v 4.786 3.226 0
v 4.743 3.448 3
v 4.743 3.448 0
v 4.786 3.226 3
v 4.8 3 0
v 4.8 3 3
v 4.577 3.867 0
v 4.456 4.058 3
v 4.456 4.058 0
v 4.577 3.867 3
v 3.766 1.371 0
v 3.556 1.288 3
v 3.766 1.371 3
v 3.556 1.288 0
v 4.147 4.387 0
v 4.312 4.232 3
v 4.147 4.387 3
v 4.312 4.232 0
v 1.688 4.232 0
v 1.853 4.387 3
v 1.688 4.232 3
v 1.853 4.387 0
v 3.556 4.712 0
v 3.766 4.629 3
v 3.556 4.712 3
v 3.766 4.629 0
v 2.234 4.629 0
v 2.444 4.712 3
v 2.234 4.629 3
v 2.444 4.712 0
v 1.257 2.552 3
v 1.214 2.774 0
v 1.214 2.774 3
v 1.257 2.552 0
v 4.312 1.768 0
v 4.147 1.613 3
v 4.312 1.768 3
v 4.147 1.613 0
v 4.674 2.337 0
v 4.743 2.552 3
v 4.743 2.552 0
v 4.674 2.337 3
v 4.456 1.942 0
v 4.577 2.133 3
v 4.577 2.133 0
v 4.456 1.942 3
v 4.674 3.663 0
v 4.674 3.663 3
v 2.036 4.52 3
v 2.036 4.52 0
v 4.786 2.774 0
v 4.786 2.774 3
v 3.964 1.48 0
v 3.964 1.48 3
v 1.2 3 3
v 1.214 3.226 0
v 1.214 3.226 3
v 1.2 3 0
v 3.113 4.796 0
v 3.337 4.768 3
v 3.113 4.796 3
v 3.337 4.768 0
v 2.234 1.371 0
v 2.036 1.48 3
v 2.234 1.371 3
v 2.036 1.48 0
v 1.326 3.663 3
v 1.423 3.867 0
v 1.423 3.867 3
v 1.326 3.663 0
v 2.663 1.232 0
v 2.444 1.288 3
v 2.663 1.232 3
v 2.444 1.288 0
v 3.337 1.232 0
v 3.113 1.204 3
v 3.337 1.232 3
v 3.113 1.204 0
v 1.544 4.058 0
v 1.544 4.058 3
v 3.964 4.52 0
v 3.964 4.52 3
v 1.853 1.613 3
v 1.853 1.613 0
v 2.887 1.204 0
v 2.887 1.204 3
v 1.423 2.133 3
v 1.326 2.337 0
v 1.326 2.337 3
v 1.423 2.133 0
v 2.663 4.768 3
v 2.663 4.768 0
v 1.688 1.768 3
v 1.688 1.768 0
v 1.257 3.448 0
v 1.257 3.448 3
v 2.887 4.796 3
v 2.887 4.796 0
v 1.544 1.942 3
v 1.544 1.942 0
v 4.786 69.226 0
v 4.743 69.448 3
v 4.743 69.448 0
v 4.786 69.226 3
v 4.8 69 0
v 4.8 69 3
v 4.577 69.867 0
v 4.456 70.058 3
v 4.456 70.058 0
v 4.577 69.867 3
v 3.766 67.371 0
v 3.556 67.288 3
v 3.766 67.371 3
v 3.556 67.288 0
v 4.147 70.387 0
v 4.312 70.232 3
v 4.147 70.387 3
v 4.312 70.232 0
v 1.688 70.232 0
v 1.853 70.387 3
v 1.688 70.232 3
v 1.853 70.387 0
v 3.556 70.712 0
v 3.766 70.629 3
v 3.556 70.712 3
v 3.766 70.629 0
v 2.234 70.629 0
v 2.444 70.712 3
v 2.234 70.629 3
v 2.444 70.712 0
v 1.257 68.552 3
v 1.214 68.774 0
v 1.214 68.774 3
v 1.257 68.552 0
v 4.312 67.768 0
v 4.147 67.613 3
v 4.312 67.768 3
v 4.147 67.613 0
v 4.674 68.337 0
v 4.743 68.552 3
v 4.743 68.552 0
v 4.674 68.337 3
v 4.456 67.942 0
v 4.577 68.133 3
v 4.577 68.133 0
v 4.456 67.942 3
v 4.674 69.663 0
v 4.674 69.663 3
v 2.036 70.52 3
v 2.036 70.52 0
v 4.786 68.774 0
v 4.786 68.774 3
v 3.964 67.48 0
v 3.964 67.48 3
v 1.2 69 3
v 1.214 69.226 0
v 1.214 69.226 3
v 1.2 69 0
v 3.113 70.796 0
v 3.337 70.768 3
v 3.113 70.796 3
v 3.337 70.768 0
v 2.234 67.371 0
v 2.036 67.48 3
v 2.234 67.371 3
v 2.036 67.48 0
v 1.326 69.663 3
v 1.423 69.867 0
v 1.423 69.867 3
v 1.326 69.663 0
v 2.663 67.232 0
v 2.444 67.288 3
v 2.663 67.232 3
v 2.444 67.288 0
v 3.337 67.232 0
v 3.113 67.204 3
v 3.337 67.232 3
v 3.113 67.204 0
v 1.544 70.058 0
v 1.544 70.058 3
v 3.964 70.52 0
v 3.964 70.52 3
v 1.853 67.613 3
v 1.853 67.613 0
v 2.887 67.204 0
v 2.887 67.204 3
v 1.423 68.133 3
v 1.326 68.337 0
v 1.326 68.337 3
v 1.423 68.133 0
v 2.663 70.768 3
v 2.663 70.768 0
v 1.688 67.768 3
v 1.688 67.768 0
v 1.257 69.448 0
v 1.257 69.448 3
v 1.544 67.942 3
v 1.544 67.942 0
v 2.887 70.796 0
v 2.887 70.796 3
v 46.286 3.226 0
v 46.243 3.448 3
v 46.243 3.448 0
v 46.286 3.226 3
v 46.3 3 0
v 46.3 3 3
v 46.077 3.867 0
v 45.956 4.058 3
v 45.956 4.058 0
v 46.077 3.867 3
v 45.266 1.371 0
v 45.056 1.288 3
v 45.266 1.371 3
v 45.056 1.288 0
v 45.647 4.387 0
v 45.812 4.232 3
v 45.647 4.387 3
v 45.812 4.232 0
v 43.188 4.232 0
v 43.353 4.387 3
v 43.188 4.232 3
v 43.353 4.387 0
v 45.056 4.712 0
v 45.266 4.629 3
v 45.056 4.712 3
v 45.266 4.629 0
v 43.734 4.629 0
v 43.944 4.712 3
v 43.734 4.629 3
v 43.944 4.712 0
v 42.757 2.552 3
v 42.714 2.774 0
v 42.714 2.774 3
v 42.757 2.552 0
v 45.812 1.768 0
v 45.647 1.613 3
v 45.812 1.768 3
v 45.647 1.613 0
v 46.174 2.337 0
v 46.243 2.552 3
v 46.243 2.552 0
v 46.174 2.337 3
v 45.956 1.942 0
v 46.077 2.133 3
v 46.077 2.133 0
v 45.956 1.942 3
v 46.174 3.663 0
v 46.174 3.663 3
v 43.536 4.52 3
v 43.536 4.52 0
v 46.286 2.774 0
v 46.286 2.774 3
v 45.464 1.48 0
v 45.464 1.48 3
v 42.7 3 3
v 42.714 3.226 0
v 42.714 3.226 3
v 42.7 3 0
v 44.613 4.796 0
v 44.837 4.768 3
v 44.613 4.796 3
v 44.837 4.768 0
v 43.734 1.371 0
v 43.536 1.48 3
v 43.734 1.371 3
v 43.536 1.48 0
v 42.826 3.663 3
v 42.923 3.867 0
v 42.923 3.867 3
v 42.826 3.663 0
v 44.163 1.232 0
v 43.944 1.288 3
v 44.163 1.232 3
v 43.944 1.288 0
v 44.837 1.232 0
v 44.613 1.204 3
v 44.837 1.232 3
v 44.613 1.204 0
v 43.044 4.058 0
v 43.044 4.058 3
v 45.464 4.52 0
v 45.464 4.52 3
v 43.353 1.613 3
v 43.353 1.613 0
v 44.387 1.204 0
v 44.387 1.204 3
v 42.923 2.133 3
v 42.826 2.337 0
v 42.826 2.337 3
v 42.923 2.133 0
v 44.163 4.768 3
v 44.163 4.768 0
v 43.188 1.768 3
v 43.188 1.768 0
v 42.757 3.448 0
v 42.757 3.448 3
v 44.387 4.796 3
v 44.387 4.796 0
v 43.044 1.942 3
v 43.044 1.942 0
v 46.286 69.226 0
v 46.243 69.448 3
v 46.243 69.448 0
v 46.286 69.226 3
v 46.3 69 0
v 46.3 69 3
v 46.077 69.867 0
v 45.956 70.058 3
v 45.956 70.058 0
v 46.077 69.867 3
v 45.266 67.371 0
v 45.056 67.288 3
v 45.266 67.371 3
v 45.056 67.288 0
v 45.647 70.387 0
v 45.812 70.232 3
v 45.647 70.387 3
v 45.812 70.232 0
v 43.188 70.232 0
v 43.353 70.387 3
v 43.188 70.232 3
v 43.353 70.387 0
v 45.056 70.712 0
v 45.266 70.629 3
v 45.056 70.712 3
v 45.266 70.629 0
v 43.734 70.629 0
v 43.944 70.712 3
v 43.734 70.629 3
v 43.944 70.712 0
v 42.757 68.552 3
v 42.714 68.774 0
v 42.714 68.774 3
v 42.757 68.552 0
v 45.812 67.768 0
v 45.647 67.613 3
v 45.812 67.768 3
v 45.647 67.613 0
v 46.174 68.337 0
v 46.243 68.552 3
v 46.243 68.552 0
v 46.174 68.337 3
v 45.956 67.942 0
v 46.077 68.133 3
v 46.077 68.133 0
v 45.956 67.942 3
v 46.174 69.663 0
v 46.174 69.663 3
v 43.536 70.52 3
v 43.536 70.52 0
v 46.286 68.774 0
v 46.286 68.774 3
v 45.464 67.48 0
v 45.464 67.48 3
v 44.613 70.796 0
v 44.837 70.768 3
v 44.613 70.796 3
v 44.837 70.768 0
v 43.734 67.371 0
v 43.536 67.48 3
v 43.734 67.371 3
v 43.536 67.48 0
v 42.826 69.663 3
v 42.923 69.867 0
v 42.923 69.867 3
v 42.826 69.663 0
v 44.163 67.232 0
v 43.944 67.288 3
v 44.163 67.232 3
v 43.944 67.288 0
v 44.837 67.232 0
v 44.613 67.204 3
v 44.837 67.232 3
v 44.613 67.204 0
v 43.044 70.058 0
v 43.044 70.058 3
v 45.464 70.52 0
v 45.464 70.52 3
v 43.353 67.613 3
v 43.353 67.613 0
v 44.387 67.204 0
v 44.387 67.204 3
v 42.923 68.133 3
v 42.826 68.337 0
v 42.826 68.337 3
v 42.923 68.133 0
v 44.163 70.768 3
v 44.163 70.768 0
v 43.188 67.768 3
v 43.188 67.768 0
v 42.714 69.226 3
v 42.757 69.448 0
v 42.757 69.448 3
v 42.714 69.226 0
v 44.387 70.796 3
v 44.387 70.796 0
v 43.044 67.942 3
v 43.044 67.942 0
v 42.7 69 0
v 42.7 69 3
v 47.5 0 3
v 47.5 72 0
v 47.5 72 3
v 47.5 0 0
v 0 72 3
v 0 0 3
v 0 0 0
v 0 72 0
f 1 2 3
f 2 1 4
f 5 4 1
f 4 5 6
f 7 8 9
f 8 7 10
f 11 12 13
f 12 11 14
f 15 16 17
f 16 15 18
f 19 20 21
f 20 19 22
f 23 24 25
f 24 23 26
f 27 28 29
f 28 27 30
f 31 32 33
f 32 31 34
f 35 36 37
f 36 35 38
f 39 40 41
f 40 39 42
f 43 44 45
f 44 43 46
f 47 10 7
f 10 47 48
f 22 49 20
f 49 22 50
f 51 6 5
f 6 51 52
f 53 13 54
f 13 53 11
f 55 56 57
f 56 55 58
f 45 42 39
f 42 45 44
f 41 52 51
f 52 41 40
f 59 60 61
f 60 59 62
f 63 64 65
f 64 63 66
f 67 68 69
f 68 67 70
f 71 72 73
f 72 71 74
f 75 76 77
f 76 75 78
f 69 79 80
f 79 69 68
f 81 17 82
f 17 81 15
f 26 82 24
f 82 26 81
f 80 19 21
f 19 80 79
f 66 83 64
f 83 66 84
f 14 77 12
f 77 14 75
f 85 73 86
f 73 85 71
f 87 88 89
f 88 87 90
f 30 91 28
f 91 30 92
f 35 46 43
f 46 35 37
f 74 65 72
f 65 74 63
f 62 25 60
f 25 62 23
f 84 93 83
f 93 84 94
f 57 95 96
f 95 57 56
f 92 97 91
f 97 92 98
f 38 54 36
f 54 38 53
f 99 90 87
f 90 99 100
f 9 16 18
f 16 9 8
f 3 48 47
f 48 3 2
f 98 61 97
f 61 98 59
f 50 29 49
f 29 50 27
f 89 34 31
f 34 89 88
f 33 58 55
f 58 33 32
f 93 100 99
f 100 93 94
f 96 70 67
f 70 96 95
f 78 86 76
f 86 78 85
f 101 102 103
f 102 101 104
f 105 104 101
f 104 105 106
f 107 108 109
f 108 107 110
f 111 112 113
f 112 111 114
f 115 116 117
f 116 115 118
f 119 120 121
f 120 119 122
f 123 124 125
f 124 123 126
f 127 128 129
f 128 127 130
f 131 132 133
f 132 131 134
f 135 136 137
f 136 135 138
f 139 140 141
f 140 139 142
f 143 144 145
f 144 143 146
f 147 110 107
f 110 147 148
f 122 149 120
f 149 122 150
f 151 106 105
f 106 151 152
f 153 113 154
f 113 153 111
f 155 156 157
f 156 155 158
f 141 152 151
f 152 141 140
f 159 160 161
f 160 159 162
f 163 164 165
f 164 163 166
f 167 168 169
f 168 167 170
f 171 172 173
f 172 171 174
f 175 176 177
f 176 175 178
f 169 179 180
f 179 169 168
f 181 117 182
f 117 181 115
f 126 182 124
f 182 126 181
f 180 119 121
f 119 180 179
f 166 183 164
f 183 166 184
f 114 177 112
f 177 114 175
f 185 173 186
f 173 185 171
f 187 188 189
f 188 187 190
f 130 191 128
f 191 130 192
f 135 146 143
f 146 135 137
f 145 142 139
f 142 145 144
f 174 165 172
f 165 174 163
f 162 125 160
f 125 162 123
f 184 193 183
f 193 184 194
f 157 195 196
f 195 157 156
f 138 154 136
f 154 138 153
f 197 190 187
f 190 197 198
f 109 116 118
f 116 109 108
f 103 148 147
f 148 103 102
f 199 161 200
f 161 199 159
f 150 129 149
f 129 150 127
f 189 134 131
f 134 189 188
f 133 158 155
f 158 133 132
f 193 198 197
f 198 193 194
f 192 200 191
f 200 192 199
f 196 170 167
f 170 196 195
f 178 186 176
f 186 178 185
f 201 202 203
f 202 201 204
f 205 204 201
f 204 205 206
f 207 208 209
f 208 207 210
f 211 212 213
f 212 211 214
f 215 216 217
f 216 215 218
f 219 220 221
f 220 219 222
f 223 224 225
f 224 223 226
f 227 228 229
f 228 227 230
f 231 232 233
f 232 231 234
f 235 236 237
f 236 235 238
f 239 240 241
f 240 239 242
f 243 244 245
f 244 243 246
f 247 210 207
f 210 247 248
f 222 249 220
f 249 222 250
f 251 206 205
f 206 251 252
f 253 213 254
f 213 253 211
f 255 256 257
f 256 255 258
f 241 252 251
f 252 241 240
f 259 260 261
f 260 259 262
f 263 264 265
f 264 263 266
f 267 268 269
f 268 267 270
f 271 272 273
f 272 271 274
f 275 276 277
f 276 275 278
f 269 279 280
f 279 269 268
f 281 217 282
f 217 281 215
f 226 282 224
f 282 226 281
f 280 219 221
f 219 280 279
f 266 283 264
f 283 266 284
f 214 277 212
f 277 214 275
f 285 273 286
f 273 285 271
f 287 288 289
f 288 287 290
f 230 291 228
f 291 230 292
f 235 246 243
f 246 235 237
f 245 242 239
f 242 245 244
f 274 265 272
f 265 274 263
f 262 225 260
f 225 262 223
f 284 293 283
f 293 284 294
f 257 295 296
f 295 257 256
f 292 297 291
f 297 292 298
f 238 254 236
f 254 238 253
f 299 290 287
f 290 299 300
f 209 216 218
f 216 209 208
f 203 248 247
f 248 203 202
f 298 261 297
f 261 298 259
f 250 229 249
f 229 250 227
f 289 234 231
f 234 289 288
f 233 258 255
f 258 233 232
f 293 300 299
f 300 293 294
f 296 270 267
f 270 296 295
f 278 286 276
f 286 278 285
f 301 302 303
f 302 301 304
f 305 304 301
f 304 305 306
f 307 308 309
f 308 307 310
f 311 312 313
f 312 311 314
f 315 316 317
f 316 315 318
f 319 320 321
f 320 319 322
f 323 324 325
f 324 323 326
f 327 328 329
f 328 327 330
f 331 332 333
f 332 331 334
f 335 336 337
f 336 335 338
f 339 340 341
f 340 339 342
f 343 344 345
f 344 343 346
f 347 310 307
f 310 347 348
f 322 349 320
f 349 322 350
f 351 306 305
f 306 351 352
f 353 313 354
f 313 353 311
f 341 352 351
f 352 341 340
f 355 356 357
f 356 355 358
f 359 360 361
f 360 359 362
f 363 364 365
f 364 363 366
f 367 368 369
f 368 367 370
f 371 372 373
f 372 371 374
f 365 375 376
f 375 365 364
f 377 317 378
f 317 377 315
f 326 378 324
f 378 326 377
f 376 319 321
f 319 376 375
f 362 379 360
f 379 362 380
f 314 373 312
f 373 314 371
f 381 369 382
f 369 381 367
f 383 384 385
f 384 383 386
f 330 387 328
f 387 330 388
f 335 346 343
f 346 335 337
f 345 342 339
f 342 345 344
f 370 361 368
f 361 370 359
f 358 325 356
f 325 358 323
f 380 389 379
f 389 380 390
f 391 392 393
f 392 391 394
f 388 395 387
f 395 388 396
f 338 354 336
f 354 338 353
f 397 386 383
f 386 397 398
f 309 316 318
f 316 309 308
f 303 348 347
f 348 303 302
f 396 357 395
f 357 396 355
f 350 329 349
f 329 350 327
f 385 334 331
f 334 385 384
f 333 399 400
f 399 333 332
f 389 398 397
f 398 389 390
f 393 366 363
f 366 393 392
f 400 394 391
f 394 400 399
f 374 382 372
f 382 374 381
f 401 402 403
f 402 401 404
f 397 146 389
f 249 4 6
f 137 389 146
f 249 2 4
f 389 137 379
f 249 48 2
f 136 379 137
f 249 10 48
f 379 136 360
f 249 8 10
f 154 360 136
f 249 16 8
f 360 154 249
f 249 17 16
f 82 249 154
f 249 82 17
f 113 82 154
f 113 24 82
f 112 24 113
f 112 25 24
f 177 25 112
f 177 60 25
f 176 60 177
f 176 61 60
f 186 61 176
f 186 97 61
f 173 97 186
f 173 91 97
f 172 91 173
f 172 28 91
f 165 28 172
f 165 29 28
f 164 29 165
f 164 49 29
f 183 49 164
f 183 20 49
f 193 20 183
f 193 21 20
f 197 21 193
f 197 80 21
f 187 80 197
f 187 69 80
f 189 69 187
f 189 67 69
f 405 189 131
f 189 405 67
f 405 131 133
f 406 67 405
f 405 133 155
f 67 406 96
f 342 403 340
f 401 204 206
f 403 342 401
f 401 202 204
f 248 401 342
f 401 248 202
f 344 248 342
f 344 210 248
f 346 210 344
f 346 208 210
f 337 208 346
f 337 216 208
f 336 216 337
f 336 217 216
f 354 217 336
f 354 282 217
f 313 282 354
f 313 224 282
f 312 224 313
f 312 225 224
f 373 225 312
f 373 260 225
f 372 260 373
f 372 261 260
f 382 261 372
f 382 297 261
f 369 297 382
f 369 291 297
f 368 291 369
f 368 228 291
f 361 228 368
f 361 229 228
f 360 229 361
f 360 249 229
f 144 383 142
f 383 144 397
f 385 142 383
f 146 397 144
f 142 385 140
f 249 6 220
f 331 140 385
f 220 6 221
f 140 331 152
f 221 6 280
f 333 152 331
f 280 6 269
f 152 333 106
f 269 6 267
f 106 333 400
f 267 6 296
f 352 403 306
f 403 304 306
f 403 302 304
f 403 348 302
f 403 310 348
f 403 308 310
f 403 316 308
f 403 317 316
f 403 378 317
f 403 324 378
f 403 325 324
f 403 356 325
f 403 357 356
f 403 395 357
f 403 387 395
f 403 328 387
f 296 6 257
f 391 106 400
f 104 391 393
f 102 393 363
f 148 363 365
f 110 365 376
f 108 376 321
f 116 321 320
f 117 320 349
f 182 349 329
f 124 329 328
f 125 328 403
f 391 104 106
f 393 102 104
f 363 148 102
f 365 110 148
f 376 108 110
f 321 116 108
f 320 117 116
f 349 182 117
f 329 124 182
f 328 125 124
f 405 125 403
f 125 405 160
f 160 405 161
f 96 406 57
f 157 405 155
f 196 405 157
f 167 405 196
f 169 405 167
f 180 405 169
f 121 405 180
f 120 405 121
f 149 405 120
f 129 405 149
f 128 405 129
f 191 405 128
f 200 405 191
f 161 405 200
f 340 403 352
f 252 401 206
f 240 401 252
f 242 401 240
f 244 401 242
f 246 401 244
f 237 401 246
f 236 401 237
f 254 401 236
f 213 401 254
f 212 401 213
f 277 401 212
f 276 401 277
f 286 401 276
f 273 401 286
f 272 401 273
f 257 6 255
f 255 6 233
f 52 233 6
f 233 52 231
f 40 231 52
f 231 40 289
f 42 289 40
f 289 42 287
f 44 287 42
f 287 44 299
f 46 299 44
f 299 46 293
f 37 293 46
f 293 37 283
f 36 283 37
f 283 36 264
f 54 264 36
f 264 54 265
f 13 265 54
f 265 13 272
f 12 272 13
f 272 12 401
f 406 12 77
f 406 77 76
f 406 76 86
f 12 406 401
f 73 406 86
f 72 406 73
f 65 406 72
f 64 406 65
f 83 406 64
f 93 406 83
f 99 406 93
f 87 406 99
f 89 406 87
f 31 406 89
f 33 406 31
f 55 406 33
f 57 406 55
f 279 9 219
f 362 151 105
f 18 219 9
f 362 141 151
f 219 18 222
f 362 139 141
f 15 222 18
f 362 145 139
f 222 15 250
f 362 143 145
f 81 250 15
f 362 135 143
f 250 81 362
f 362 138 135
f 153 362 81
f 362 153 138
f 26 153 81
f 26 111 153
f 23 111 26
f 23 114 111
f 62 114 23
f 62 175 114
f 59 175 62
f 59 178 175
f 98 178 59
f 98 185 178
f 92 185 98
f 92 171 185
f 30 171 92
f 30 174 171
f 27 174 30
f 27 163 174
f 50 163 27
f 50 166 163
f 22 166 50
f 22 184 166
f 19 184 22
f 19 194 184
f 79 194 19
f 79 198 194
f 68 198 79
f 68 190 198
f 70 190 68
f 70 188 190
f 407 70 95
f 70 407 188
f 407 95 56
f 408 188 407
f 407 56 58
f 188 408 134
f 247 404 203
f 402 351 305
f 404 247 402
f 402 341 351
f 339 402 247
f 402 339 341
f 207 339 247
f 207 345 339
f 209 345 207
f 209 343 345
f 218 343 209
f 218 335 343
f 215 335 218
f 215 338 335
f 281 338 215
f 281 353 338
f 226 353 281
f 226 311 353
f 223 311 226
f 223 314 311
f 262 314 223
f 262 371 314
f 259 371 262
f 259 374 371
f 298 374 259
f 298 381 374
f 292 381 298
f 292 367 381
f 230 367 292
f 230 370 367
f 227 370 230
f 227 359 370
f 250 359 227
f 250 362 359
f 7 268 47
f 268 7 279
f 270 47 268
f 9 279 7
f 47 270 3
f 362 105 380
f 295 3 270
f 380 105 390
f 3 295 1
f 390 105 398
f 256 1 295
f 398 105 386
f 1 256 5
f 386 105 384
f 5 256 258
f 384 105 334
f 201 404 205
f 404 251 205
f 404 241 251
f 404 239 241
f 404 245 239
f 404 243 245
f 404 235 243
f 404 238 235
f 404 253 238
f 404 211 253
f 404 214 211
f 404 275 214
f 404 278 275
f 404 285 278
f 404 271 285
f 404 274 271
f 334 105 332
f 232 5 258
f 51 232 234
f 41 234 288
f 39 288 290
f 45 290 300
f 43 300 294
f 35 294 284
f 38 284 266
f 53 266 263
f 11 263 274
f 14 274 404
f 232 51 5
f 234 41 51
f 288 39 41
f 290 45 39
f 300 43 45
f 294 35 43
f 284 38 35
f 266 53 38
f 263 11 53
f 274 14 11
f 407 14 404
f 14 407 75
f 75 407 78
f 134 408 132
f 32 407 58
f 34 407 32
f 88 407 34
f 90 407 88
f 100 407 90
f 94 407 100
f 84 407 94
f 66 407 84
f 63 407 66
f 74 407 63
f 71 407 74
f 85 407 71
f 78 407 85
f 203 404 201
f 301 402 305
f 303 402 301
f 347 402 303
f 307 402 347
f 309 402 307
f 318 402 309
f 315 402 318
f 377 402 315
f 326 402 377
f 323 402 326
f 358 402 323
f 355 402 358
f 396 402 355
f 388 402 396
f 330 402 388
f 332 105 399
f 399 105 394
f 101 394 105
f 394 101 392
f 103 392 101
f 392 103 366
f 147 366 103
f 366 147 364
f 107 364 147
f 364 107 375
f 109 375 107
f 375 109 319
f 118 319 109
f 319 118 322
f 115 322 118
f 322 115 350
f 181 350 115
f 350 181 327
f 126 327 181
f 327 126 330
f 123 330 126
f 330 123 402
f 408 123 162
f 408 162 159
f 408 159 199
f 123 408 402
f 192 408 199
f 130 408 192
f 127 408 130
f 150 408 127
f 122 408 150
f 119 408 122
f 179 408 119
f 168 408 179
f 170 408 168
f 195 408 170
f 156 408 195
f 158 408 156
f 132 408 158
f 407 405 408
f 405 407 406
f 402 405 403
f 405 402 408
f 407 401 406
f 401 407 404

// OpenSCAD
//
// 秋月電子の C基板と同形状の板
//
// AkizukiPCB_TypeC-1-20250506A.scad
//
// Last update: 2025-05-26(Mon) 11:50 JST / 2025-05-26(Mon) 02:50 UTC
//

// パネルサイズと穴位置
Pw = 47.5; Ph = 72.0; Pz = 3;   // 縦・横・厚
Hd = 3.6;                       // 穴径。ちょっと大きめ
Hp = 3.0; // + Hd/2;            // 穴位置

// ベースパネルに  穴4つ（角から Hp だけ内側に）
difference() {
  cube([Pw, Ph, Pz]);
  for (x = [Hp, Pw - Hp])
    for (y = [Hp, Ph - Hp])
      translate([x, y, -1.0])
        cylinder(h = Pz + 2.0, d = Hd, $fn = 50);
}
